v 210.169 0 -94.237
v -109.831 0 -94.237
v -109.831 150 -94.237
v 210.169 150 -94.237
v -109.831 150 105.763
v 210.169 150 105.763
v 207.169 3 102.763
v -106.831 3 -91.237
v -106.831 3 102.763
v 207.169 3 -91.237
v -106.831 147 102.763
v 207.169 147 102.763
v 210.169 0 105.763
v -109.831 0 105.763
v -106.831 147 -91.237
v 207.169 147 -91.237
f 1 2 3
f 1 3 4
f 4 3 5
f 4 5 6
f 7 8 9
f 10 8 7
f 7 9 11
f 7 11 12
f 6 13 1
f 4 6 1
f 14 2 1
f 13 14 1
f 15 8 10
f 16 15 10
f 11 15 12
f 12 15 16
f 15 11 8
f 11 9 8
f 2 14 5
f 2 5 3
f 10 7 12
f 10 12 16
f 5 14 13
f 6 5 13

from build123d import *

# Parameters (mm, degrees)
SKETCH1_W           = 320
SKETCH1_H           = 200
BOSS_EXTRUDE1_DEPTH = 150
SHELL2_T            = 3


with BuildPart() as part:
    # Sketch1 → Boss-Extrude1 (new body)
    with BuildSketch(Plane(origin=(0, 0, 0), x_dir=(1, 0, 0), z_dir=(0, 1, 0))):
        with Locations((50.169491525, -5.762711864)):
            Rectangle(SKETCH1_W, SKETCH1_H)
    extrude(amount=BOSS_EXTRUDE1_DEPTH)

    # Shell2 (no face opened: a closed hollow body)
    add(offset(amount=-SHELL2_T, mode=Mode.PRIVATE), mode=Mode.SUBTRACT)


solid = part.part
